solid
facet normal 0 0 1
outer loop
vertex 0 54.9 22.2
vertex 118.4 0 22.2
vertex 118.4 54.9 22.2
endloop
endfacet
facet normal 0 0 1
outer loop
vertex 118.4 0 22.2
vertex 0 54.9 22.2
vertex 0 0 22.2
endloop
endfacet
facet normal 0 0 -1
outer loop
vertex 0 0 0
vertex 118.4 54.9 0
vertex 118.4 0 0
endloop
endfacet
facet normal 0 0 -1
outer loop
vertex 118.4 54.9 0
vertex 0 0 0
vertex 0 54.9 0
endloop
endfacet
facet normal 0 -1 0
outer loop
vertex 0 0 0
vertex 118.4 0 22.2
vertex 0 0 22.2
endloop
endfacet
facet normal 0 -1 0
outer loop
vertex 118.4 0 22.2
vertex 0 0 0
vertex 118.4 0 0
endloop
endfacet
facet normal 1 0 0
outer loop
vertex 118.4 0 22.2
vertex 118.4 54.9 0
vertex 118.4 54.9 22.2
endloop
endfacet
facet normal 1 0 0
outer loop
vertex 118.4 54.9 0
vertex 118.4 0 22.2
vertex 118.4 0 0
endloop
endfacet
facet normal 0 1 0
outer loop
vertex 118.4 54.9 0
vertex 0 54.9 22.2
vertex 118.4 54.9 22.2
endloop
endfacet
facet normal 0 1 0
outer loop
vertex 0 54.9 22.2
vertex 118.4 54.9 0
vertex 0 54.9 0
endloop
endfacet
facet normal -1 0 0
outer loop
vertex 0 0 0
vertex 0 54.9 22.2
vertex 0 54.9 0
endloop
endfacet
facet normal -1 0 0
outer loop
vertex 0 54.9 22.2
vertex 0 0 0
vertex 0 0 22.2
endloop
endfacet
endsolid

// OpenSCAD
outer = 56+0.5;
inner = 53;
shell_thickness = 0.8;
edge_d = 30;
edge_r = edge_d/2;
in_h = 10;
in_d = 14;
out_tube_r = 17 / 2 + 0.1;
out_tube_x_offset = 14 + 0.8;

in_port_w = 20;
in_port_thickness = 1;

inner_height = in_h + in_port_thickness;

$fn = 100;

//main();

part_g();

module part_g() {
    thickness = 0.8;
    port_d = in_d + 2*2;
    port_h = 10;
    cube([130, outer, in_d + 2*2 + 5] - [thickness*2+port_h, thickness*2, thickness]);
}

module part_f() {
    thickness = 0.8;
    port_d = in_d + 2*2;
    port_h = 10;
    
            translate([-thickness, -thickness, 0]) 
                cube([130, outer, 2]);
}

module part_e() {
    thickness = 0.8;
    port_d = in_d + 2*2;
    port_h = 10;
    
    difference() {
        union() {
            translate([-thickness, -thickness, 0]) 
                cube([130, outer, 5 + 3] + [thickness*2, thickness*2, thickness]);
        }
        cube([130, outer, 5+ 3]);
        translate([5, 5]) cube([130, outer, 5 + 3] + [-5*2, -5*2, thickness]);
    }
}

module part_d() {
    thickness = 0.8;
    port_d = in_d + 2*2;
    port_h = 10;
    module body() difference() {
        union() {
            translate([-thickness, -thickness, -thickness]) 
                cube([130, outer, in_d + 2*2 + 5]);
        }
        cube([130, outer, in_d + 2*2 + 5] - [thickness*2, thickness*2, thickness]);
    }
    
    difference() {
        union() {
            body();
            translate([0, outer / 2, port_d/2]) rotate([0, 90, 0])
                cylinder(d = port_d+thickness*2, h = port_h);
        }
        translate([-thickness, outer / 2, port_d/2]) rotate([0, 90, 0])
            cylinder(d = port_d, h = port_h+thickness);
    }
}

module part_c() {
    difference() {
        union() {
            translate([-in_port_w/2, -in_port_w/2]) cube([in_port_w, in_port_w, 1]);
            translate([0, 0, -1]) cylinder(d = in_port_w + 10, h = in_port_thickness);
            cylinder(d = in_d + 2*2, h = 10);
        }
        
        cylinder(d = in_d, h = 999, center = true);
    }
}

module part_b() {
    difference() {
        union() {
            translate([-in_port_w/2, -in_port_w/2]) cube([in_port_w, in_port_w, 1]);
            translate([0, 0, -1]) cylinder(d = in_port_w + 10, h = in_port_thickness);
            cylinder(d = in_d + 2*2, h = 10);
            
            linear_extrude(height = 100, twist = 360) difference() {
                circle(d = in_d + 2*2);
                square([6, 99], center = true);
                square([99, 6], center = true);
            }
        }
        
        cylinder(d = in_d, h = 999, center = true);
    }
    
    translate([0, 0, 100]) cylinder(d = in_d + 2*2, h = 2);
}

module main() {
    difference() {
        linear_extrude(height = inner_height) shell_2d();
        translate([out_tube_r - outer/2 + out_tube_x_offset, 0])
            rotate([-90, 0]) cylinder(h = 99, r = out_tube_r);
    }

    translate([0, 0, inner_height]) linear_extrude(height = 1) difference() {
        outer_2d();
        square(in_port_w, center = true);
    }

    snap();
}

module snap() {
    depth = 1.8+0.2;
    x_offset = 1.5;
    wide = 27;
    
    half();
    mirror([1, 0]) half();
    
    
    module half() difference() {
        translate([-(inner/2-0.5), -(wide+1.5*2)/2, -depth-1]) {
            cube([2, wide+1.5*2, 7+0.5]);
            translate([-1.5, 0, depth+1+0.5]) cube([1.5, wide+1.5*2, 7-depth-1]);
        }
        difference() {
            translate([-(inner/2), -wide/2, -depth]) {
                translate([0, 0, 0]) cube([9.9, wide, depth]);
            }
            cube([999, 15, 999], center = true);
        }
        cube([999, 15-1.5*2, 999], center = true);
    }
}

module snap_2() {
    depth = 7+4;
    a = [8, 1.5+1, inner_height + depth];
    
    one();
    mirror([1, 0]) one();
    mirror([0, 1]) one();
    mirror([1, 1]) one();
    
    module one() intersection() {
        rotate([0, 0, -45]) {
            translate([-a[0]/2, 50.5/2-1, -depth]) cube(a);
            translate([-1/2, 50.5/2, -5]) cube([1, 99, inner_height + 5]);
        }
        union () {
            translate([0, 0, -99]) linear_extrude(height = 999) inner_2d();
            linear_extrude(height = inner_height) 
                offset(delta = -shell_thickness) outer_2d();
        }
    }
}

module snap_old() {
    // 1.5
    depth = 1.5;
    x_offset = 1.5;
    wide = 27;
    
    half();
    mirror([1, 0]) half();
    
    
    module half() difference() {
        translate([-(inner/2 - x_offset), -wide/2, -depth]) {
            translate([-x_offset, 0, depth]) cube([1+x_offset, wide, 2]);
            cube([1, wide, depth]);
            translate([-1, 0, -1]) cube([2, wide, 1]);
        }
        cube([999, 14, 999], center = true);
    }
}

module shell_2d() {
    difference() {
        outer_2d();
        offset(delta = -shell_thickness) outer_2d();
    }
}

module inner_2d() offset(delta = -(outer-inner)/2) outer_2d();

module outer_2d() hull () {
    translate([-(outer/2-edge_r), -(outer/2-edge_r)]) circle(r=edge_r);
    translate([(outer/2-edge_r), -(outer/2-edge_r)]) circle(r=edge_r);
    translate([-(outer/2-edge_r), (outer/2-edge_r)]) circle(r=edge_r);
    translate([(outer/2-edge_r), (outer/2-edge_r)]) circle(r=edge_r);
}
